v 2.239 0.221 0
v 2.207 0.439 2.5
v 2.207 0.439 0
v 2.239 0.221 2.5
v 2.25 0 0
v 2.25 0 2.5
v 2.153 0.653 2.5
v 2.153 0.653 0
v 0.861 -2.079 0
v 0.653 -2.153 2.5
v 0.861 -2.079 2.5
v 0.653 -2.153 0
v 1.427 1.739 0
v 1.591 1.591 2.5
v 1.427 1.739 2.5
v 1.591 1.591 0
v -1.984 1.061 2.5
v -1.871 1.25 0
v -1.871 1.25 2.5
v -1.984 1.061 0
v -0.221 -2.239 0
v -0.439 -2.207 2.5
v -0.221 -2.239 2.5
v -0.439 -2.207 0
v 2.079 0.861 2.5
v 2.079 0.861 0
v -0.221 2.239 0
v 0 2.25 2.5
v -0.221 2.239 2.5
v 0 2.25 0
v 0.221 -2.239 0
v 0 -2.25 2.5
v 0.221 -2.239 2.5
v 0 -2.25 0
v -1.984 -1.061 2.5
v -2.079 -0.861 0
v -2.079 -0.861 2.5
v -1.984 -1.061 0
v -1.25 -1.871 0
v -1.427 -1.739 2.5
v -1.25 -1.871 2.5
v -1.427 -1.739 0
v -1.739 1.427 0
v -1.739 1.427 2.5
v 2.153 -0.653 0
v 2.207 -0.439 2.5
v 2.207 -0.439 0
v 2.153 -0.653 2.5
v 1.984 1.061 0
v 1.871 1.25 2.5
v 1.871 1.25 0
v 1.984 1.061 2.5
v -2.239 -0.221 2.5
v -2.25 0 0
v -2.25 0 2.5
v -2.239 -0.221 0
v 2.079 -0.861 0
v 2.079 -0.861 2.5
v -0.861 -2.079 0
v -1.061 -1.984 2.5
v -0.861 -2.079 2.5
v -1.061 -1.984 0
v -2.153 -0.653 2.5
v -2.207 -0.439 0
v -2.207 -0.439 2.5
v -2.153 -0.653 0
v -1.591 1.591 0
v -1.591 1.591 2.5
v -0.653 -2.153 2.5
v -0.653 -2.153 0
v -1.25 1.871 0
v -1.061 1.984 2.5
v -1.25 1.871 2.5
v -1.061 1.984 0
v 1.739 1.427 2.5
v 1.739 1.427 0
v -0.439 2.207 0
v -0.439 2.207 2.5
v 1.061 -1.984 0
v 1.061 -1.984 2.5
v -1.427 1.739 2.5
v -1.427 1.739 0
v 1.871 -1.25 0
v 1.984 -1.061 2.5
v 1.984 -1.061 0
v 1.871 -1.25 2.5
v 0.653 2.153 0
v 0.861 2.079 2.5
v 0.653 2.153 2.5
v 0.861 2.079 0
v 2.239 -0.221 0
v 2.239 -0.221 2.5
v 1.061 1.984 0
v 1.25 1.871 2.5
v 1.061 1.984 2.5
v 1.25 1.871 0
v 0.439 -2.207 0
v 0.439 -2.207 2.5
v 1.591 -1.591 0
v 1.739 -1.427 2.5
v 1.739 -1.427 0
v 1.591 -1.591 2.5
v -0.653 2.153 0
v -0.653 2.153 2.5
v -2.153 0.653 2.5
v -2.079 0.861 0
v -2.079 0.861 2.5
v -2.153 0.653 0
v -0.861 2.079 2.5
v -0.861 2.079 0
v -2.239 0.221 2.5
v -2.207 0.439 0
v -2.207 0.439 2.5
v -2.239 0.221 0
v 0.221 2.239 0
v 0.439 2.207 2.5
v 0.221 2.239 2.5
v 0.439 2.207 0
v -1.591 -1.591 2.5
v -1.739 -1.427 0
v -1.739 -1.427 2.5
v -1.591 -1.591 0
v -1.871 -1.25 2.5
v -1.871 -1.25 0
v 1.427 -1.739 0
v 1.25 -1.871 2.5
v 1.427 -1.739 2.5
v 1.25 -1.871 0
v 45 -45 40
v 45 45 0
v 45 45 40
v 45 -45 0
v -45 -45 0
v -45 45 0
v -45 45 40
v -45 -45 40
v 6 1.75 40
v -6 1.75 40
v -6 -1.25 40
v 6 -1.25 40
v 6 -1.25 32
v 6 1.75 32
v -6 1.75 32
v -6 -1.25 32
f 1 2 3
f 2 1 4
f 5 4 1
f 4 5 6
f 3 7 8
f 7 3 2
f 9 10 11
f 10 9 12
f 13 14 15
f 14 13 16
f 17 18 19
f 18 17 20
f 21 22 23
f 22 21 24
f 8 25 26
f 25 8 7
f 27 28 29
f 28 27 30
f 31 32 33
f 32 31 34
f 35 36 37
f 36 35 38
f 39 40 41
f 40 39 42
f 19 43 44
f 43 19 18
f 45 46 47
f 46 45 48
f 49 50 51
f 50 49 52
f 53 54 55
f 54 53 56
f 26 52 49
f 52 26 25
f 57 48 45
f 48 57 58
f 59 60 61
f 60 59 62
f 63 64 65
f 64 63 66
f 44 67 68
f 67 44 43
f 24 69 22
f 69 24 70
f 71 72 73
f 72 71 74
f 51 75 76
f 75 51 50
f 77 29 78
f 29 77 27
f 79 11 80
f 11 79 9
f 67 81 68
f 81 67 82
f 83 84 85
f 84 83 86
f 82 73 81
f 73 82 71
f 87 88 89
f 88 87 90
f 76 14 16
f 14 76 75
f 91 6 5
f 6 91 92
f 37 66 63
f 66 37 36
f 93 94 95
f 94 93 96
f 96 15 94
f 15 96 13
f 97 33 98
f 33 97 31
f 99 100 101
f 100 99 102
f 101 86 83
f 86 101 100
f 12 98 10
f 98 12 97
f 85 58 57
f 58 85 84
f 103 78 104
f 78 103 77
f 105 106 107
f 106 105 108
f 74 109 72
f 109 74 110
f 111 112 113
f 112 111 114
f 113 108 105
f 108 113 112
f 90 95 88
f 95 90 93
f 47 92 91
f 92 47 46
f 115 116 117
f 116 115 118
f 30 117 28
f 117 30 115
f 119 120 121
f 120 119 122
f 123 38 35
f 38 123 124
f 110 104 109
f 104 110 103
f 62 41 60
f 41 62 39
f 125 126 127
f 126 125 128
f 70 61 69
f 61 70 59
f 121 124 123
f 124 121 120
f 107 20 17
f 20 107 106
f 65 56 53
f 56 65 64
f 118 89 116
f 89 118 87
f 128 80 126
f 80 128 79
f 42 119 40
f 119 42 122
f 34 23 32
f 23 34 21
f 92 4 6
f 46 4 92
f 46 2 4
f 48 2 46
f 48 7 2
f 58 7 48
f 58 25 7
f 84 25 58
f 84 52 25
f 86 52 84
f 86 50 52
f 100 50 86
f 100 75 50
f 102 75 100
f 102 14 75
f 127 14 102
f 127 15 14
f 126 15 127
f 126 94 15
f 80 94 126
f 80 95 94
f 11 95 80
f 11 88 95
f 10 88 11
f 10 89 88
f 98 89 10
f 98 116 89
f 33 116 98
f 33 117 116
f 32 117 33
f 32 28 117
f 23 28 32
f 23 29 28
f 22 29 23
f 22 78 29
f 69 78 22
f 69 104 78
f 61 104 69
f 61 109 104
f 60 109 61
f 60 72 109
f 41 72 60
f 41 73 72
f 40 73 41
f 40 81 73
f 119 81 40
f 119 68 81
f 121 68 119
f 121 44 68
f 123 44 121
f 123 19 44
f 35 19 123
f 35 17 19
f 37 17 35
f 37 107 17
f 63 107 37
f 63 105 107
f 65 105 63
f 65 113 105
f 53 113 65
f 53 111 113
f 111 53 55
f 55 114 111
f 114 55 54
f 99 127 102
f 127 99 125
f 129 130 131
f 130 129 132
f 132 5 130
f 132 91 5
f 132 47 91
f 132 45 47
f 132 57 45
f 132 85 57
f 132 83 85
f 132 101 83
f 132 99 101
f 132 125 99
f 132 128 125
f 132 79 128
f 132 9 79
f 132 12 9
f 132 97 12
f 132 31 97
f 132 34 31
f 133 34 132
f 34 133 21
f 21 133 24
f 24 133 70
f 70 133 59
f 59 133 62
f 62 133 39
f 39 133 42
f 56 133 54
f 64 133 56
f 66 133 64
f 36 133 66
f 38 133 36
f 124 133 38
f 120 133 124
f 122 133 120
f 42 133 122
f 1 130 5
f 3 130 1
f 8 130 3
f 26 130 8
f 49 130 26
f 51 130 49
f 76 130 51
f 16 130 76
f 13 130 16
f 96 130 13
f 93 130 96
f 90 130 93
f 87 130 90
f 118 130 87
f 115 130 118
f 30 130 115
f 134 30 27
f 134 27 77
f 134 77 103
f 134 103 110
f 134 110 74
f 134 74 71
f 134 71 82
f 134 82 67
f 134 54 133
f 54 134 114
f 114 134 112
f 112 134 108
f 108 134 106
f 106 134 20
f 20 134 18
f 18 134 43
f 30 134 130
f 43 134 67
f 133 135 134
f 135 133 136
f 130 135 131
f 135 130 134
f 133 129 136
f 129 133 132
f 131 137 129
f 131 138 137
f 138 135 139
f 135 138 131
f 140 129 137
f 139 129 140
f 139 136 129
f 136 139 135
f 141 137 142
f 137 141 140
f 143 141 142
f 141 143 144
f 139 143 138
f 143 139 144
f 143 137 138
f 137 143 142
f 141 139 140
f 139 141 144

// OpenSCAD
// Magnetic stirrer housing - open box covering an 80 mm PC case fan
// Print orientation: top plate on bed (z = 0 to 2), walls rise to z = 40

// ---- Dimensions (mm) ----
plate_t      = 2;     // top plate thickness
wall_t       = 2.5;    // wall thickness
outer_x      = 90;     // outer size in X
outer_y      = 90;     // outer size in Y
open_top_z   = 40;     // height of open top
notch_w      = 12;     // cable notch width
notch_bottom = 32;     // notch starts here (bottom of notch)
notch_top    = open_top_z; // notch reaches the open edge
screw       = 4.5;     // M4 screw hole diameter
screw_pitch = 50;     // square diagonal between screw centres
eps          = 0.5;    // cutter overshoot

$fn = 64;

difference() {
    // Solid block
    translate([-outer_x/2, -outer_y/2, 0])
        cube([outer_x, outer_y, open_top_z + wall_t]);

    // Open top (hollow above z = open_top_z)
    translate([-outer_x/2, -outer_y/2, open_top_z])
        cube([outer_x, outer_y, wall_t + eps]);

    // Screw holes in top plate
    for (i = [0:3]) {
        rotate([0, 0, i * 90])
            translate([0, 0, -eps])
                cylinder(d = screw, h = plate_t + 2*eps);
    }

    // Cable notch in one wall
    translate([-notch_w/2, -wall_t/2, notch_bottom])
        cube([notch_w, wall_t + eps, notch_top - notch_bottom + eps]);
}
